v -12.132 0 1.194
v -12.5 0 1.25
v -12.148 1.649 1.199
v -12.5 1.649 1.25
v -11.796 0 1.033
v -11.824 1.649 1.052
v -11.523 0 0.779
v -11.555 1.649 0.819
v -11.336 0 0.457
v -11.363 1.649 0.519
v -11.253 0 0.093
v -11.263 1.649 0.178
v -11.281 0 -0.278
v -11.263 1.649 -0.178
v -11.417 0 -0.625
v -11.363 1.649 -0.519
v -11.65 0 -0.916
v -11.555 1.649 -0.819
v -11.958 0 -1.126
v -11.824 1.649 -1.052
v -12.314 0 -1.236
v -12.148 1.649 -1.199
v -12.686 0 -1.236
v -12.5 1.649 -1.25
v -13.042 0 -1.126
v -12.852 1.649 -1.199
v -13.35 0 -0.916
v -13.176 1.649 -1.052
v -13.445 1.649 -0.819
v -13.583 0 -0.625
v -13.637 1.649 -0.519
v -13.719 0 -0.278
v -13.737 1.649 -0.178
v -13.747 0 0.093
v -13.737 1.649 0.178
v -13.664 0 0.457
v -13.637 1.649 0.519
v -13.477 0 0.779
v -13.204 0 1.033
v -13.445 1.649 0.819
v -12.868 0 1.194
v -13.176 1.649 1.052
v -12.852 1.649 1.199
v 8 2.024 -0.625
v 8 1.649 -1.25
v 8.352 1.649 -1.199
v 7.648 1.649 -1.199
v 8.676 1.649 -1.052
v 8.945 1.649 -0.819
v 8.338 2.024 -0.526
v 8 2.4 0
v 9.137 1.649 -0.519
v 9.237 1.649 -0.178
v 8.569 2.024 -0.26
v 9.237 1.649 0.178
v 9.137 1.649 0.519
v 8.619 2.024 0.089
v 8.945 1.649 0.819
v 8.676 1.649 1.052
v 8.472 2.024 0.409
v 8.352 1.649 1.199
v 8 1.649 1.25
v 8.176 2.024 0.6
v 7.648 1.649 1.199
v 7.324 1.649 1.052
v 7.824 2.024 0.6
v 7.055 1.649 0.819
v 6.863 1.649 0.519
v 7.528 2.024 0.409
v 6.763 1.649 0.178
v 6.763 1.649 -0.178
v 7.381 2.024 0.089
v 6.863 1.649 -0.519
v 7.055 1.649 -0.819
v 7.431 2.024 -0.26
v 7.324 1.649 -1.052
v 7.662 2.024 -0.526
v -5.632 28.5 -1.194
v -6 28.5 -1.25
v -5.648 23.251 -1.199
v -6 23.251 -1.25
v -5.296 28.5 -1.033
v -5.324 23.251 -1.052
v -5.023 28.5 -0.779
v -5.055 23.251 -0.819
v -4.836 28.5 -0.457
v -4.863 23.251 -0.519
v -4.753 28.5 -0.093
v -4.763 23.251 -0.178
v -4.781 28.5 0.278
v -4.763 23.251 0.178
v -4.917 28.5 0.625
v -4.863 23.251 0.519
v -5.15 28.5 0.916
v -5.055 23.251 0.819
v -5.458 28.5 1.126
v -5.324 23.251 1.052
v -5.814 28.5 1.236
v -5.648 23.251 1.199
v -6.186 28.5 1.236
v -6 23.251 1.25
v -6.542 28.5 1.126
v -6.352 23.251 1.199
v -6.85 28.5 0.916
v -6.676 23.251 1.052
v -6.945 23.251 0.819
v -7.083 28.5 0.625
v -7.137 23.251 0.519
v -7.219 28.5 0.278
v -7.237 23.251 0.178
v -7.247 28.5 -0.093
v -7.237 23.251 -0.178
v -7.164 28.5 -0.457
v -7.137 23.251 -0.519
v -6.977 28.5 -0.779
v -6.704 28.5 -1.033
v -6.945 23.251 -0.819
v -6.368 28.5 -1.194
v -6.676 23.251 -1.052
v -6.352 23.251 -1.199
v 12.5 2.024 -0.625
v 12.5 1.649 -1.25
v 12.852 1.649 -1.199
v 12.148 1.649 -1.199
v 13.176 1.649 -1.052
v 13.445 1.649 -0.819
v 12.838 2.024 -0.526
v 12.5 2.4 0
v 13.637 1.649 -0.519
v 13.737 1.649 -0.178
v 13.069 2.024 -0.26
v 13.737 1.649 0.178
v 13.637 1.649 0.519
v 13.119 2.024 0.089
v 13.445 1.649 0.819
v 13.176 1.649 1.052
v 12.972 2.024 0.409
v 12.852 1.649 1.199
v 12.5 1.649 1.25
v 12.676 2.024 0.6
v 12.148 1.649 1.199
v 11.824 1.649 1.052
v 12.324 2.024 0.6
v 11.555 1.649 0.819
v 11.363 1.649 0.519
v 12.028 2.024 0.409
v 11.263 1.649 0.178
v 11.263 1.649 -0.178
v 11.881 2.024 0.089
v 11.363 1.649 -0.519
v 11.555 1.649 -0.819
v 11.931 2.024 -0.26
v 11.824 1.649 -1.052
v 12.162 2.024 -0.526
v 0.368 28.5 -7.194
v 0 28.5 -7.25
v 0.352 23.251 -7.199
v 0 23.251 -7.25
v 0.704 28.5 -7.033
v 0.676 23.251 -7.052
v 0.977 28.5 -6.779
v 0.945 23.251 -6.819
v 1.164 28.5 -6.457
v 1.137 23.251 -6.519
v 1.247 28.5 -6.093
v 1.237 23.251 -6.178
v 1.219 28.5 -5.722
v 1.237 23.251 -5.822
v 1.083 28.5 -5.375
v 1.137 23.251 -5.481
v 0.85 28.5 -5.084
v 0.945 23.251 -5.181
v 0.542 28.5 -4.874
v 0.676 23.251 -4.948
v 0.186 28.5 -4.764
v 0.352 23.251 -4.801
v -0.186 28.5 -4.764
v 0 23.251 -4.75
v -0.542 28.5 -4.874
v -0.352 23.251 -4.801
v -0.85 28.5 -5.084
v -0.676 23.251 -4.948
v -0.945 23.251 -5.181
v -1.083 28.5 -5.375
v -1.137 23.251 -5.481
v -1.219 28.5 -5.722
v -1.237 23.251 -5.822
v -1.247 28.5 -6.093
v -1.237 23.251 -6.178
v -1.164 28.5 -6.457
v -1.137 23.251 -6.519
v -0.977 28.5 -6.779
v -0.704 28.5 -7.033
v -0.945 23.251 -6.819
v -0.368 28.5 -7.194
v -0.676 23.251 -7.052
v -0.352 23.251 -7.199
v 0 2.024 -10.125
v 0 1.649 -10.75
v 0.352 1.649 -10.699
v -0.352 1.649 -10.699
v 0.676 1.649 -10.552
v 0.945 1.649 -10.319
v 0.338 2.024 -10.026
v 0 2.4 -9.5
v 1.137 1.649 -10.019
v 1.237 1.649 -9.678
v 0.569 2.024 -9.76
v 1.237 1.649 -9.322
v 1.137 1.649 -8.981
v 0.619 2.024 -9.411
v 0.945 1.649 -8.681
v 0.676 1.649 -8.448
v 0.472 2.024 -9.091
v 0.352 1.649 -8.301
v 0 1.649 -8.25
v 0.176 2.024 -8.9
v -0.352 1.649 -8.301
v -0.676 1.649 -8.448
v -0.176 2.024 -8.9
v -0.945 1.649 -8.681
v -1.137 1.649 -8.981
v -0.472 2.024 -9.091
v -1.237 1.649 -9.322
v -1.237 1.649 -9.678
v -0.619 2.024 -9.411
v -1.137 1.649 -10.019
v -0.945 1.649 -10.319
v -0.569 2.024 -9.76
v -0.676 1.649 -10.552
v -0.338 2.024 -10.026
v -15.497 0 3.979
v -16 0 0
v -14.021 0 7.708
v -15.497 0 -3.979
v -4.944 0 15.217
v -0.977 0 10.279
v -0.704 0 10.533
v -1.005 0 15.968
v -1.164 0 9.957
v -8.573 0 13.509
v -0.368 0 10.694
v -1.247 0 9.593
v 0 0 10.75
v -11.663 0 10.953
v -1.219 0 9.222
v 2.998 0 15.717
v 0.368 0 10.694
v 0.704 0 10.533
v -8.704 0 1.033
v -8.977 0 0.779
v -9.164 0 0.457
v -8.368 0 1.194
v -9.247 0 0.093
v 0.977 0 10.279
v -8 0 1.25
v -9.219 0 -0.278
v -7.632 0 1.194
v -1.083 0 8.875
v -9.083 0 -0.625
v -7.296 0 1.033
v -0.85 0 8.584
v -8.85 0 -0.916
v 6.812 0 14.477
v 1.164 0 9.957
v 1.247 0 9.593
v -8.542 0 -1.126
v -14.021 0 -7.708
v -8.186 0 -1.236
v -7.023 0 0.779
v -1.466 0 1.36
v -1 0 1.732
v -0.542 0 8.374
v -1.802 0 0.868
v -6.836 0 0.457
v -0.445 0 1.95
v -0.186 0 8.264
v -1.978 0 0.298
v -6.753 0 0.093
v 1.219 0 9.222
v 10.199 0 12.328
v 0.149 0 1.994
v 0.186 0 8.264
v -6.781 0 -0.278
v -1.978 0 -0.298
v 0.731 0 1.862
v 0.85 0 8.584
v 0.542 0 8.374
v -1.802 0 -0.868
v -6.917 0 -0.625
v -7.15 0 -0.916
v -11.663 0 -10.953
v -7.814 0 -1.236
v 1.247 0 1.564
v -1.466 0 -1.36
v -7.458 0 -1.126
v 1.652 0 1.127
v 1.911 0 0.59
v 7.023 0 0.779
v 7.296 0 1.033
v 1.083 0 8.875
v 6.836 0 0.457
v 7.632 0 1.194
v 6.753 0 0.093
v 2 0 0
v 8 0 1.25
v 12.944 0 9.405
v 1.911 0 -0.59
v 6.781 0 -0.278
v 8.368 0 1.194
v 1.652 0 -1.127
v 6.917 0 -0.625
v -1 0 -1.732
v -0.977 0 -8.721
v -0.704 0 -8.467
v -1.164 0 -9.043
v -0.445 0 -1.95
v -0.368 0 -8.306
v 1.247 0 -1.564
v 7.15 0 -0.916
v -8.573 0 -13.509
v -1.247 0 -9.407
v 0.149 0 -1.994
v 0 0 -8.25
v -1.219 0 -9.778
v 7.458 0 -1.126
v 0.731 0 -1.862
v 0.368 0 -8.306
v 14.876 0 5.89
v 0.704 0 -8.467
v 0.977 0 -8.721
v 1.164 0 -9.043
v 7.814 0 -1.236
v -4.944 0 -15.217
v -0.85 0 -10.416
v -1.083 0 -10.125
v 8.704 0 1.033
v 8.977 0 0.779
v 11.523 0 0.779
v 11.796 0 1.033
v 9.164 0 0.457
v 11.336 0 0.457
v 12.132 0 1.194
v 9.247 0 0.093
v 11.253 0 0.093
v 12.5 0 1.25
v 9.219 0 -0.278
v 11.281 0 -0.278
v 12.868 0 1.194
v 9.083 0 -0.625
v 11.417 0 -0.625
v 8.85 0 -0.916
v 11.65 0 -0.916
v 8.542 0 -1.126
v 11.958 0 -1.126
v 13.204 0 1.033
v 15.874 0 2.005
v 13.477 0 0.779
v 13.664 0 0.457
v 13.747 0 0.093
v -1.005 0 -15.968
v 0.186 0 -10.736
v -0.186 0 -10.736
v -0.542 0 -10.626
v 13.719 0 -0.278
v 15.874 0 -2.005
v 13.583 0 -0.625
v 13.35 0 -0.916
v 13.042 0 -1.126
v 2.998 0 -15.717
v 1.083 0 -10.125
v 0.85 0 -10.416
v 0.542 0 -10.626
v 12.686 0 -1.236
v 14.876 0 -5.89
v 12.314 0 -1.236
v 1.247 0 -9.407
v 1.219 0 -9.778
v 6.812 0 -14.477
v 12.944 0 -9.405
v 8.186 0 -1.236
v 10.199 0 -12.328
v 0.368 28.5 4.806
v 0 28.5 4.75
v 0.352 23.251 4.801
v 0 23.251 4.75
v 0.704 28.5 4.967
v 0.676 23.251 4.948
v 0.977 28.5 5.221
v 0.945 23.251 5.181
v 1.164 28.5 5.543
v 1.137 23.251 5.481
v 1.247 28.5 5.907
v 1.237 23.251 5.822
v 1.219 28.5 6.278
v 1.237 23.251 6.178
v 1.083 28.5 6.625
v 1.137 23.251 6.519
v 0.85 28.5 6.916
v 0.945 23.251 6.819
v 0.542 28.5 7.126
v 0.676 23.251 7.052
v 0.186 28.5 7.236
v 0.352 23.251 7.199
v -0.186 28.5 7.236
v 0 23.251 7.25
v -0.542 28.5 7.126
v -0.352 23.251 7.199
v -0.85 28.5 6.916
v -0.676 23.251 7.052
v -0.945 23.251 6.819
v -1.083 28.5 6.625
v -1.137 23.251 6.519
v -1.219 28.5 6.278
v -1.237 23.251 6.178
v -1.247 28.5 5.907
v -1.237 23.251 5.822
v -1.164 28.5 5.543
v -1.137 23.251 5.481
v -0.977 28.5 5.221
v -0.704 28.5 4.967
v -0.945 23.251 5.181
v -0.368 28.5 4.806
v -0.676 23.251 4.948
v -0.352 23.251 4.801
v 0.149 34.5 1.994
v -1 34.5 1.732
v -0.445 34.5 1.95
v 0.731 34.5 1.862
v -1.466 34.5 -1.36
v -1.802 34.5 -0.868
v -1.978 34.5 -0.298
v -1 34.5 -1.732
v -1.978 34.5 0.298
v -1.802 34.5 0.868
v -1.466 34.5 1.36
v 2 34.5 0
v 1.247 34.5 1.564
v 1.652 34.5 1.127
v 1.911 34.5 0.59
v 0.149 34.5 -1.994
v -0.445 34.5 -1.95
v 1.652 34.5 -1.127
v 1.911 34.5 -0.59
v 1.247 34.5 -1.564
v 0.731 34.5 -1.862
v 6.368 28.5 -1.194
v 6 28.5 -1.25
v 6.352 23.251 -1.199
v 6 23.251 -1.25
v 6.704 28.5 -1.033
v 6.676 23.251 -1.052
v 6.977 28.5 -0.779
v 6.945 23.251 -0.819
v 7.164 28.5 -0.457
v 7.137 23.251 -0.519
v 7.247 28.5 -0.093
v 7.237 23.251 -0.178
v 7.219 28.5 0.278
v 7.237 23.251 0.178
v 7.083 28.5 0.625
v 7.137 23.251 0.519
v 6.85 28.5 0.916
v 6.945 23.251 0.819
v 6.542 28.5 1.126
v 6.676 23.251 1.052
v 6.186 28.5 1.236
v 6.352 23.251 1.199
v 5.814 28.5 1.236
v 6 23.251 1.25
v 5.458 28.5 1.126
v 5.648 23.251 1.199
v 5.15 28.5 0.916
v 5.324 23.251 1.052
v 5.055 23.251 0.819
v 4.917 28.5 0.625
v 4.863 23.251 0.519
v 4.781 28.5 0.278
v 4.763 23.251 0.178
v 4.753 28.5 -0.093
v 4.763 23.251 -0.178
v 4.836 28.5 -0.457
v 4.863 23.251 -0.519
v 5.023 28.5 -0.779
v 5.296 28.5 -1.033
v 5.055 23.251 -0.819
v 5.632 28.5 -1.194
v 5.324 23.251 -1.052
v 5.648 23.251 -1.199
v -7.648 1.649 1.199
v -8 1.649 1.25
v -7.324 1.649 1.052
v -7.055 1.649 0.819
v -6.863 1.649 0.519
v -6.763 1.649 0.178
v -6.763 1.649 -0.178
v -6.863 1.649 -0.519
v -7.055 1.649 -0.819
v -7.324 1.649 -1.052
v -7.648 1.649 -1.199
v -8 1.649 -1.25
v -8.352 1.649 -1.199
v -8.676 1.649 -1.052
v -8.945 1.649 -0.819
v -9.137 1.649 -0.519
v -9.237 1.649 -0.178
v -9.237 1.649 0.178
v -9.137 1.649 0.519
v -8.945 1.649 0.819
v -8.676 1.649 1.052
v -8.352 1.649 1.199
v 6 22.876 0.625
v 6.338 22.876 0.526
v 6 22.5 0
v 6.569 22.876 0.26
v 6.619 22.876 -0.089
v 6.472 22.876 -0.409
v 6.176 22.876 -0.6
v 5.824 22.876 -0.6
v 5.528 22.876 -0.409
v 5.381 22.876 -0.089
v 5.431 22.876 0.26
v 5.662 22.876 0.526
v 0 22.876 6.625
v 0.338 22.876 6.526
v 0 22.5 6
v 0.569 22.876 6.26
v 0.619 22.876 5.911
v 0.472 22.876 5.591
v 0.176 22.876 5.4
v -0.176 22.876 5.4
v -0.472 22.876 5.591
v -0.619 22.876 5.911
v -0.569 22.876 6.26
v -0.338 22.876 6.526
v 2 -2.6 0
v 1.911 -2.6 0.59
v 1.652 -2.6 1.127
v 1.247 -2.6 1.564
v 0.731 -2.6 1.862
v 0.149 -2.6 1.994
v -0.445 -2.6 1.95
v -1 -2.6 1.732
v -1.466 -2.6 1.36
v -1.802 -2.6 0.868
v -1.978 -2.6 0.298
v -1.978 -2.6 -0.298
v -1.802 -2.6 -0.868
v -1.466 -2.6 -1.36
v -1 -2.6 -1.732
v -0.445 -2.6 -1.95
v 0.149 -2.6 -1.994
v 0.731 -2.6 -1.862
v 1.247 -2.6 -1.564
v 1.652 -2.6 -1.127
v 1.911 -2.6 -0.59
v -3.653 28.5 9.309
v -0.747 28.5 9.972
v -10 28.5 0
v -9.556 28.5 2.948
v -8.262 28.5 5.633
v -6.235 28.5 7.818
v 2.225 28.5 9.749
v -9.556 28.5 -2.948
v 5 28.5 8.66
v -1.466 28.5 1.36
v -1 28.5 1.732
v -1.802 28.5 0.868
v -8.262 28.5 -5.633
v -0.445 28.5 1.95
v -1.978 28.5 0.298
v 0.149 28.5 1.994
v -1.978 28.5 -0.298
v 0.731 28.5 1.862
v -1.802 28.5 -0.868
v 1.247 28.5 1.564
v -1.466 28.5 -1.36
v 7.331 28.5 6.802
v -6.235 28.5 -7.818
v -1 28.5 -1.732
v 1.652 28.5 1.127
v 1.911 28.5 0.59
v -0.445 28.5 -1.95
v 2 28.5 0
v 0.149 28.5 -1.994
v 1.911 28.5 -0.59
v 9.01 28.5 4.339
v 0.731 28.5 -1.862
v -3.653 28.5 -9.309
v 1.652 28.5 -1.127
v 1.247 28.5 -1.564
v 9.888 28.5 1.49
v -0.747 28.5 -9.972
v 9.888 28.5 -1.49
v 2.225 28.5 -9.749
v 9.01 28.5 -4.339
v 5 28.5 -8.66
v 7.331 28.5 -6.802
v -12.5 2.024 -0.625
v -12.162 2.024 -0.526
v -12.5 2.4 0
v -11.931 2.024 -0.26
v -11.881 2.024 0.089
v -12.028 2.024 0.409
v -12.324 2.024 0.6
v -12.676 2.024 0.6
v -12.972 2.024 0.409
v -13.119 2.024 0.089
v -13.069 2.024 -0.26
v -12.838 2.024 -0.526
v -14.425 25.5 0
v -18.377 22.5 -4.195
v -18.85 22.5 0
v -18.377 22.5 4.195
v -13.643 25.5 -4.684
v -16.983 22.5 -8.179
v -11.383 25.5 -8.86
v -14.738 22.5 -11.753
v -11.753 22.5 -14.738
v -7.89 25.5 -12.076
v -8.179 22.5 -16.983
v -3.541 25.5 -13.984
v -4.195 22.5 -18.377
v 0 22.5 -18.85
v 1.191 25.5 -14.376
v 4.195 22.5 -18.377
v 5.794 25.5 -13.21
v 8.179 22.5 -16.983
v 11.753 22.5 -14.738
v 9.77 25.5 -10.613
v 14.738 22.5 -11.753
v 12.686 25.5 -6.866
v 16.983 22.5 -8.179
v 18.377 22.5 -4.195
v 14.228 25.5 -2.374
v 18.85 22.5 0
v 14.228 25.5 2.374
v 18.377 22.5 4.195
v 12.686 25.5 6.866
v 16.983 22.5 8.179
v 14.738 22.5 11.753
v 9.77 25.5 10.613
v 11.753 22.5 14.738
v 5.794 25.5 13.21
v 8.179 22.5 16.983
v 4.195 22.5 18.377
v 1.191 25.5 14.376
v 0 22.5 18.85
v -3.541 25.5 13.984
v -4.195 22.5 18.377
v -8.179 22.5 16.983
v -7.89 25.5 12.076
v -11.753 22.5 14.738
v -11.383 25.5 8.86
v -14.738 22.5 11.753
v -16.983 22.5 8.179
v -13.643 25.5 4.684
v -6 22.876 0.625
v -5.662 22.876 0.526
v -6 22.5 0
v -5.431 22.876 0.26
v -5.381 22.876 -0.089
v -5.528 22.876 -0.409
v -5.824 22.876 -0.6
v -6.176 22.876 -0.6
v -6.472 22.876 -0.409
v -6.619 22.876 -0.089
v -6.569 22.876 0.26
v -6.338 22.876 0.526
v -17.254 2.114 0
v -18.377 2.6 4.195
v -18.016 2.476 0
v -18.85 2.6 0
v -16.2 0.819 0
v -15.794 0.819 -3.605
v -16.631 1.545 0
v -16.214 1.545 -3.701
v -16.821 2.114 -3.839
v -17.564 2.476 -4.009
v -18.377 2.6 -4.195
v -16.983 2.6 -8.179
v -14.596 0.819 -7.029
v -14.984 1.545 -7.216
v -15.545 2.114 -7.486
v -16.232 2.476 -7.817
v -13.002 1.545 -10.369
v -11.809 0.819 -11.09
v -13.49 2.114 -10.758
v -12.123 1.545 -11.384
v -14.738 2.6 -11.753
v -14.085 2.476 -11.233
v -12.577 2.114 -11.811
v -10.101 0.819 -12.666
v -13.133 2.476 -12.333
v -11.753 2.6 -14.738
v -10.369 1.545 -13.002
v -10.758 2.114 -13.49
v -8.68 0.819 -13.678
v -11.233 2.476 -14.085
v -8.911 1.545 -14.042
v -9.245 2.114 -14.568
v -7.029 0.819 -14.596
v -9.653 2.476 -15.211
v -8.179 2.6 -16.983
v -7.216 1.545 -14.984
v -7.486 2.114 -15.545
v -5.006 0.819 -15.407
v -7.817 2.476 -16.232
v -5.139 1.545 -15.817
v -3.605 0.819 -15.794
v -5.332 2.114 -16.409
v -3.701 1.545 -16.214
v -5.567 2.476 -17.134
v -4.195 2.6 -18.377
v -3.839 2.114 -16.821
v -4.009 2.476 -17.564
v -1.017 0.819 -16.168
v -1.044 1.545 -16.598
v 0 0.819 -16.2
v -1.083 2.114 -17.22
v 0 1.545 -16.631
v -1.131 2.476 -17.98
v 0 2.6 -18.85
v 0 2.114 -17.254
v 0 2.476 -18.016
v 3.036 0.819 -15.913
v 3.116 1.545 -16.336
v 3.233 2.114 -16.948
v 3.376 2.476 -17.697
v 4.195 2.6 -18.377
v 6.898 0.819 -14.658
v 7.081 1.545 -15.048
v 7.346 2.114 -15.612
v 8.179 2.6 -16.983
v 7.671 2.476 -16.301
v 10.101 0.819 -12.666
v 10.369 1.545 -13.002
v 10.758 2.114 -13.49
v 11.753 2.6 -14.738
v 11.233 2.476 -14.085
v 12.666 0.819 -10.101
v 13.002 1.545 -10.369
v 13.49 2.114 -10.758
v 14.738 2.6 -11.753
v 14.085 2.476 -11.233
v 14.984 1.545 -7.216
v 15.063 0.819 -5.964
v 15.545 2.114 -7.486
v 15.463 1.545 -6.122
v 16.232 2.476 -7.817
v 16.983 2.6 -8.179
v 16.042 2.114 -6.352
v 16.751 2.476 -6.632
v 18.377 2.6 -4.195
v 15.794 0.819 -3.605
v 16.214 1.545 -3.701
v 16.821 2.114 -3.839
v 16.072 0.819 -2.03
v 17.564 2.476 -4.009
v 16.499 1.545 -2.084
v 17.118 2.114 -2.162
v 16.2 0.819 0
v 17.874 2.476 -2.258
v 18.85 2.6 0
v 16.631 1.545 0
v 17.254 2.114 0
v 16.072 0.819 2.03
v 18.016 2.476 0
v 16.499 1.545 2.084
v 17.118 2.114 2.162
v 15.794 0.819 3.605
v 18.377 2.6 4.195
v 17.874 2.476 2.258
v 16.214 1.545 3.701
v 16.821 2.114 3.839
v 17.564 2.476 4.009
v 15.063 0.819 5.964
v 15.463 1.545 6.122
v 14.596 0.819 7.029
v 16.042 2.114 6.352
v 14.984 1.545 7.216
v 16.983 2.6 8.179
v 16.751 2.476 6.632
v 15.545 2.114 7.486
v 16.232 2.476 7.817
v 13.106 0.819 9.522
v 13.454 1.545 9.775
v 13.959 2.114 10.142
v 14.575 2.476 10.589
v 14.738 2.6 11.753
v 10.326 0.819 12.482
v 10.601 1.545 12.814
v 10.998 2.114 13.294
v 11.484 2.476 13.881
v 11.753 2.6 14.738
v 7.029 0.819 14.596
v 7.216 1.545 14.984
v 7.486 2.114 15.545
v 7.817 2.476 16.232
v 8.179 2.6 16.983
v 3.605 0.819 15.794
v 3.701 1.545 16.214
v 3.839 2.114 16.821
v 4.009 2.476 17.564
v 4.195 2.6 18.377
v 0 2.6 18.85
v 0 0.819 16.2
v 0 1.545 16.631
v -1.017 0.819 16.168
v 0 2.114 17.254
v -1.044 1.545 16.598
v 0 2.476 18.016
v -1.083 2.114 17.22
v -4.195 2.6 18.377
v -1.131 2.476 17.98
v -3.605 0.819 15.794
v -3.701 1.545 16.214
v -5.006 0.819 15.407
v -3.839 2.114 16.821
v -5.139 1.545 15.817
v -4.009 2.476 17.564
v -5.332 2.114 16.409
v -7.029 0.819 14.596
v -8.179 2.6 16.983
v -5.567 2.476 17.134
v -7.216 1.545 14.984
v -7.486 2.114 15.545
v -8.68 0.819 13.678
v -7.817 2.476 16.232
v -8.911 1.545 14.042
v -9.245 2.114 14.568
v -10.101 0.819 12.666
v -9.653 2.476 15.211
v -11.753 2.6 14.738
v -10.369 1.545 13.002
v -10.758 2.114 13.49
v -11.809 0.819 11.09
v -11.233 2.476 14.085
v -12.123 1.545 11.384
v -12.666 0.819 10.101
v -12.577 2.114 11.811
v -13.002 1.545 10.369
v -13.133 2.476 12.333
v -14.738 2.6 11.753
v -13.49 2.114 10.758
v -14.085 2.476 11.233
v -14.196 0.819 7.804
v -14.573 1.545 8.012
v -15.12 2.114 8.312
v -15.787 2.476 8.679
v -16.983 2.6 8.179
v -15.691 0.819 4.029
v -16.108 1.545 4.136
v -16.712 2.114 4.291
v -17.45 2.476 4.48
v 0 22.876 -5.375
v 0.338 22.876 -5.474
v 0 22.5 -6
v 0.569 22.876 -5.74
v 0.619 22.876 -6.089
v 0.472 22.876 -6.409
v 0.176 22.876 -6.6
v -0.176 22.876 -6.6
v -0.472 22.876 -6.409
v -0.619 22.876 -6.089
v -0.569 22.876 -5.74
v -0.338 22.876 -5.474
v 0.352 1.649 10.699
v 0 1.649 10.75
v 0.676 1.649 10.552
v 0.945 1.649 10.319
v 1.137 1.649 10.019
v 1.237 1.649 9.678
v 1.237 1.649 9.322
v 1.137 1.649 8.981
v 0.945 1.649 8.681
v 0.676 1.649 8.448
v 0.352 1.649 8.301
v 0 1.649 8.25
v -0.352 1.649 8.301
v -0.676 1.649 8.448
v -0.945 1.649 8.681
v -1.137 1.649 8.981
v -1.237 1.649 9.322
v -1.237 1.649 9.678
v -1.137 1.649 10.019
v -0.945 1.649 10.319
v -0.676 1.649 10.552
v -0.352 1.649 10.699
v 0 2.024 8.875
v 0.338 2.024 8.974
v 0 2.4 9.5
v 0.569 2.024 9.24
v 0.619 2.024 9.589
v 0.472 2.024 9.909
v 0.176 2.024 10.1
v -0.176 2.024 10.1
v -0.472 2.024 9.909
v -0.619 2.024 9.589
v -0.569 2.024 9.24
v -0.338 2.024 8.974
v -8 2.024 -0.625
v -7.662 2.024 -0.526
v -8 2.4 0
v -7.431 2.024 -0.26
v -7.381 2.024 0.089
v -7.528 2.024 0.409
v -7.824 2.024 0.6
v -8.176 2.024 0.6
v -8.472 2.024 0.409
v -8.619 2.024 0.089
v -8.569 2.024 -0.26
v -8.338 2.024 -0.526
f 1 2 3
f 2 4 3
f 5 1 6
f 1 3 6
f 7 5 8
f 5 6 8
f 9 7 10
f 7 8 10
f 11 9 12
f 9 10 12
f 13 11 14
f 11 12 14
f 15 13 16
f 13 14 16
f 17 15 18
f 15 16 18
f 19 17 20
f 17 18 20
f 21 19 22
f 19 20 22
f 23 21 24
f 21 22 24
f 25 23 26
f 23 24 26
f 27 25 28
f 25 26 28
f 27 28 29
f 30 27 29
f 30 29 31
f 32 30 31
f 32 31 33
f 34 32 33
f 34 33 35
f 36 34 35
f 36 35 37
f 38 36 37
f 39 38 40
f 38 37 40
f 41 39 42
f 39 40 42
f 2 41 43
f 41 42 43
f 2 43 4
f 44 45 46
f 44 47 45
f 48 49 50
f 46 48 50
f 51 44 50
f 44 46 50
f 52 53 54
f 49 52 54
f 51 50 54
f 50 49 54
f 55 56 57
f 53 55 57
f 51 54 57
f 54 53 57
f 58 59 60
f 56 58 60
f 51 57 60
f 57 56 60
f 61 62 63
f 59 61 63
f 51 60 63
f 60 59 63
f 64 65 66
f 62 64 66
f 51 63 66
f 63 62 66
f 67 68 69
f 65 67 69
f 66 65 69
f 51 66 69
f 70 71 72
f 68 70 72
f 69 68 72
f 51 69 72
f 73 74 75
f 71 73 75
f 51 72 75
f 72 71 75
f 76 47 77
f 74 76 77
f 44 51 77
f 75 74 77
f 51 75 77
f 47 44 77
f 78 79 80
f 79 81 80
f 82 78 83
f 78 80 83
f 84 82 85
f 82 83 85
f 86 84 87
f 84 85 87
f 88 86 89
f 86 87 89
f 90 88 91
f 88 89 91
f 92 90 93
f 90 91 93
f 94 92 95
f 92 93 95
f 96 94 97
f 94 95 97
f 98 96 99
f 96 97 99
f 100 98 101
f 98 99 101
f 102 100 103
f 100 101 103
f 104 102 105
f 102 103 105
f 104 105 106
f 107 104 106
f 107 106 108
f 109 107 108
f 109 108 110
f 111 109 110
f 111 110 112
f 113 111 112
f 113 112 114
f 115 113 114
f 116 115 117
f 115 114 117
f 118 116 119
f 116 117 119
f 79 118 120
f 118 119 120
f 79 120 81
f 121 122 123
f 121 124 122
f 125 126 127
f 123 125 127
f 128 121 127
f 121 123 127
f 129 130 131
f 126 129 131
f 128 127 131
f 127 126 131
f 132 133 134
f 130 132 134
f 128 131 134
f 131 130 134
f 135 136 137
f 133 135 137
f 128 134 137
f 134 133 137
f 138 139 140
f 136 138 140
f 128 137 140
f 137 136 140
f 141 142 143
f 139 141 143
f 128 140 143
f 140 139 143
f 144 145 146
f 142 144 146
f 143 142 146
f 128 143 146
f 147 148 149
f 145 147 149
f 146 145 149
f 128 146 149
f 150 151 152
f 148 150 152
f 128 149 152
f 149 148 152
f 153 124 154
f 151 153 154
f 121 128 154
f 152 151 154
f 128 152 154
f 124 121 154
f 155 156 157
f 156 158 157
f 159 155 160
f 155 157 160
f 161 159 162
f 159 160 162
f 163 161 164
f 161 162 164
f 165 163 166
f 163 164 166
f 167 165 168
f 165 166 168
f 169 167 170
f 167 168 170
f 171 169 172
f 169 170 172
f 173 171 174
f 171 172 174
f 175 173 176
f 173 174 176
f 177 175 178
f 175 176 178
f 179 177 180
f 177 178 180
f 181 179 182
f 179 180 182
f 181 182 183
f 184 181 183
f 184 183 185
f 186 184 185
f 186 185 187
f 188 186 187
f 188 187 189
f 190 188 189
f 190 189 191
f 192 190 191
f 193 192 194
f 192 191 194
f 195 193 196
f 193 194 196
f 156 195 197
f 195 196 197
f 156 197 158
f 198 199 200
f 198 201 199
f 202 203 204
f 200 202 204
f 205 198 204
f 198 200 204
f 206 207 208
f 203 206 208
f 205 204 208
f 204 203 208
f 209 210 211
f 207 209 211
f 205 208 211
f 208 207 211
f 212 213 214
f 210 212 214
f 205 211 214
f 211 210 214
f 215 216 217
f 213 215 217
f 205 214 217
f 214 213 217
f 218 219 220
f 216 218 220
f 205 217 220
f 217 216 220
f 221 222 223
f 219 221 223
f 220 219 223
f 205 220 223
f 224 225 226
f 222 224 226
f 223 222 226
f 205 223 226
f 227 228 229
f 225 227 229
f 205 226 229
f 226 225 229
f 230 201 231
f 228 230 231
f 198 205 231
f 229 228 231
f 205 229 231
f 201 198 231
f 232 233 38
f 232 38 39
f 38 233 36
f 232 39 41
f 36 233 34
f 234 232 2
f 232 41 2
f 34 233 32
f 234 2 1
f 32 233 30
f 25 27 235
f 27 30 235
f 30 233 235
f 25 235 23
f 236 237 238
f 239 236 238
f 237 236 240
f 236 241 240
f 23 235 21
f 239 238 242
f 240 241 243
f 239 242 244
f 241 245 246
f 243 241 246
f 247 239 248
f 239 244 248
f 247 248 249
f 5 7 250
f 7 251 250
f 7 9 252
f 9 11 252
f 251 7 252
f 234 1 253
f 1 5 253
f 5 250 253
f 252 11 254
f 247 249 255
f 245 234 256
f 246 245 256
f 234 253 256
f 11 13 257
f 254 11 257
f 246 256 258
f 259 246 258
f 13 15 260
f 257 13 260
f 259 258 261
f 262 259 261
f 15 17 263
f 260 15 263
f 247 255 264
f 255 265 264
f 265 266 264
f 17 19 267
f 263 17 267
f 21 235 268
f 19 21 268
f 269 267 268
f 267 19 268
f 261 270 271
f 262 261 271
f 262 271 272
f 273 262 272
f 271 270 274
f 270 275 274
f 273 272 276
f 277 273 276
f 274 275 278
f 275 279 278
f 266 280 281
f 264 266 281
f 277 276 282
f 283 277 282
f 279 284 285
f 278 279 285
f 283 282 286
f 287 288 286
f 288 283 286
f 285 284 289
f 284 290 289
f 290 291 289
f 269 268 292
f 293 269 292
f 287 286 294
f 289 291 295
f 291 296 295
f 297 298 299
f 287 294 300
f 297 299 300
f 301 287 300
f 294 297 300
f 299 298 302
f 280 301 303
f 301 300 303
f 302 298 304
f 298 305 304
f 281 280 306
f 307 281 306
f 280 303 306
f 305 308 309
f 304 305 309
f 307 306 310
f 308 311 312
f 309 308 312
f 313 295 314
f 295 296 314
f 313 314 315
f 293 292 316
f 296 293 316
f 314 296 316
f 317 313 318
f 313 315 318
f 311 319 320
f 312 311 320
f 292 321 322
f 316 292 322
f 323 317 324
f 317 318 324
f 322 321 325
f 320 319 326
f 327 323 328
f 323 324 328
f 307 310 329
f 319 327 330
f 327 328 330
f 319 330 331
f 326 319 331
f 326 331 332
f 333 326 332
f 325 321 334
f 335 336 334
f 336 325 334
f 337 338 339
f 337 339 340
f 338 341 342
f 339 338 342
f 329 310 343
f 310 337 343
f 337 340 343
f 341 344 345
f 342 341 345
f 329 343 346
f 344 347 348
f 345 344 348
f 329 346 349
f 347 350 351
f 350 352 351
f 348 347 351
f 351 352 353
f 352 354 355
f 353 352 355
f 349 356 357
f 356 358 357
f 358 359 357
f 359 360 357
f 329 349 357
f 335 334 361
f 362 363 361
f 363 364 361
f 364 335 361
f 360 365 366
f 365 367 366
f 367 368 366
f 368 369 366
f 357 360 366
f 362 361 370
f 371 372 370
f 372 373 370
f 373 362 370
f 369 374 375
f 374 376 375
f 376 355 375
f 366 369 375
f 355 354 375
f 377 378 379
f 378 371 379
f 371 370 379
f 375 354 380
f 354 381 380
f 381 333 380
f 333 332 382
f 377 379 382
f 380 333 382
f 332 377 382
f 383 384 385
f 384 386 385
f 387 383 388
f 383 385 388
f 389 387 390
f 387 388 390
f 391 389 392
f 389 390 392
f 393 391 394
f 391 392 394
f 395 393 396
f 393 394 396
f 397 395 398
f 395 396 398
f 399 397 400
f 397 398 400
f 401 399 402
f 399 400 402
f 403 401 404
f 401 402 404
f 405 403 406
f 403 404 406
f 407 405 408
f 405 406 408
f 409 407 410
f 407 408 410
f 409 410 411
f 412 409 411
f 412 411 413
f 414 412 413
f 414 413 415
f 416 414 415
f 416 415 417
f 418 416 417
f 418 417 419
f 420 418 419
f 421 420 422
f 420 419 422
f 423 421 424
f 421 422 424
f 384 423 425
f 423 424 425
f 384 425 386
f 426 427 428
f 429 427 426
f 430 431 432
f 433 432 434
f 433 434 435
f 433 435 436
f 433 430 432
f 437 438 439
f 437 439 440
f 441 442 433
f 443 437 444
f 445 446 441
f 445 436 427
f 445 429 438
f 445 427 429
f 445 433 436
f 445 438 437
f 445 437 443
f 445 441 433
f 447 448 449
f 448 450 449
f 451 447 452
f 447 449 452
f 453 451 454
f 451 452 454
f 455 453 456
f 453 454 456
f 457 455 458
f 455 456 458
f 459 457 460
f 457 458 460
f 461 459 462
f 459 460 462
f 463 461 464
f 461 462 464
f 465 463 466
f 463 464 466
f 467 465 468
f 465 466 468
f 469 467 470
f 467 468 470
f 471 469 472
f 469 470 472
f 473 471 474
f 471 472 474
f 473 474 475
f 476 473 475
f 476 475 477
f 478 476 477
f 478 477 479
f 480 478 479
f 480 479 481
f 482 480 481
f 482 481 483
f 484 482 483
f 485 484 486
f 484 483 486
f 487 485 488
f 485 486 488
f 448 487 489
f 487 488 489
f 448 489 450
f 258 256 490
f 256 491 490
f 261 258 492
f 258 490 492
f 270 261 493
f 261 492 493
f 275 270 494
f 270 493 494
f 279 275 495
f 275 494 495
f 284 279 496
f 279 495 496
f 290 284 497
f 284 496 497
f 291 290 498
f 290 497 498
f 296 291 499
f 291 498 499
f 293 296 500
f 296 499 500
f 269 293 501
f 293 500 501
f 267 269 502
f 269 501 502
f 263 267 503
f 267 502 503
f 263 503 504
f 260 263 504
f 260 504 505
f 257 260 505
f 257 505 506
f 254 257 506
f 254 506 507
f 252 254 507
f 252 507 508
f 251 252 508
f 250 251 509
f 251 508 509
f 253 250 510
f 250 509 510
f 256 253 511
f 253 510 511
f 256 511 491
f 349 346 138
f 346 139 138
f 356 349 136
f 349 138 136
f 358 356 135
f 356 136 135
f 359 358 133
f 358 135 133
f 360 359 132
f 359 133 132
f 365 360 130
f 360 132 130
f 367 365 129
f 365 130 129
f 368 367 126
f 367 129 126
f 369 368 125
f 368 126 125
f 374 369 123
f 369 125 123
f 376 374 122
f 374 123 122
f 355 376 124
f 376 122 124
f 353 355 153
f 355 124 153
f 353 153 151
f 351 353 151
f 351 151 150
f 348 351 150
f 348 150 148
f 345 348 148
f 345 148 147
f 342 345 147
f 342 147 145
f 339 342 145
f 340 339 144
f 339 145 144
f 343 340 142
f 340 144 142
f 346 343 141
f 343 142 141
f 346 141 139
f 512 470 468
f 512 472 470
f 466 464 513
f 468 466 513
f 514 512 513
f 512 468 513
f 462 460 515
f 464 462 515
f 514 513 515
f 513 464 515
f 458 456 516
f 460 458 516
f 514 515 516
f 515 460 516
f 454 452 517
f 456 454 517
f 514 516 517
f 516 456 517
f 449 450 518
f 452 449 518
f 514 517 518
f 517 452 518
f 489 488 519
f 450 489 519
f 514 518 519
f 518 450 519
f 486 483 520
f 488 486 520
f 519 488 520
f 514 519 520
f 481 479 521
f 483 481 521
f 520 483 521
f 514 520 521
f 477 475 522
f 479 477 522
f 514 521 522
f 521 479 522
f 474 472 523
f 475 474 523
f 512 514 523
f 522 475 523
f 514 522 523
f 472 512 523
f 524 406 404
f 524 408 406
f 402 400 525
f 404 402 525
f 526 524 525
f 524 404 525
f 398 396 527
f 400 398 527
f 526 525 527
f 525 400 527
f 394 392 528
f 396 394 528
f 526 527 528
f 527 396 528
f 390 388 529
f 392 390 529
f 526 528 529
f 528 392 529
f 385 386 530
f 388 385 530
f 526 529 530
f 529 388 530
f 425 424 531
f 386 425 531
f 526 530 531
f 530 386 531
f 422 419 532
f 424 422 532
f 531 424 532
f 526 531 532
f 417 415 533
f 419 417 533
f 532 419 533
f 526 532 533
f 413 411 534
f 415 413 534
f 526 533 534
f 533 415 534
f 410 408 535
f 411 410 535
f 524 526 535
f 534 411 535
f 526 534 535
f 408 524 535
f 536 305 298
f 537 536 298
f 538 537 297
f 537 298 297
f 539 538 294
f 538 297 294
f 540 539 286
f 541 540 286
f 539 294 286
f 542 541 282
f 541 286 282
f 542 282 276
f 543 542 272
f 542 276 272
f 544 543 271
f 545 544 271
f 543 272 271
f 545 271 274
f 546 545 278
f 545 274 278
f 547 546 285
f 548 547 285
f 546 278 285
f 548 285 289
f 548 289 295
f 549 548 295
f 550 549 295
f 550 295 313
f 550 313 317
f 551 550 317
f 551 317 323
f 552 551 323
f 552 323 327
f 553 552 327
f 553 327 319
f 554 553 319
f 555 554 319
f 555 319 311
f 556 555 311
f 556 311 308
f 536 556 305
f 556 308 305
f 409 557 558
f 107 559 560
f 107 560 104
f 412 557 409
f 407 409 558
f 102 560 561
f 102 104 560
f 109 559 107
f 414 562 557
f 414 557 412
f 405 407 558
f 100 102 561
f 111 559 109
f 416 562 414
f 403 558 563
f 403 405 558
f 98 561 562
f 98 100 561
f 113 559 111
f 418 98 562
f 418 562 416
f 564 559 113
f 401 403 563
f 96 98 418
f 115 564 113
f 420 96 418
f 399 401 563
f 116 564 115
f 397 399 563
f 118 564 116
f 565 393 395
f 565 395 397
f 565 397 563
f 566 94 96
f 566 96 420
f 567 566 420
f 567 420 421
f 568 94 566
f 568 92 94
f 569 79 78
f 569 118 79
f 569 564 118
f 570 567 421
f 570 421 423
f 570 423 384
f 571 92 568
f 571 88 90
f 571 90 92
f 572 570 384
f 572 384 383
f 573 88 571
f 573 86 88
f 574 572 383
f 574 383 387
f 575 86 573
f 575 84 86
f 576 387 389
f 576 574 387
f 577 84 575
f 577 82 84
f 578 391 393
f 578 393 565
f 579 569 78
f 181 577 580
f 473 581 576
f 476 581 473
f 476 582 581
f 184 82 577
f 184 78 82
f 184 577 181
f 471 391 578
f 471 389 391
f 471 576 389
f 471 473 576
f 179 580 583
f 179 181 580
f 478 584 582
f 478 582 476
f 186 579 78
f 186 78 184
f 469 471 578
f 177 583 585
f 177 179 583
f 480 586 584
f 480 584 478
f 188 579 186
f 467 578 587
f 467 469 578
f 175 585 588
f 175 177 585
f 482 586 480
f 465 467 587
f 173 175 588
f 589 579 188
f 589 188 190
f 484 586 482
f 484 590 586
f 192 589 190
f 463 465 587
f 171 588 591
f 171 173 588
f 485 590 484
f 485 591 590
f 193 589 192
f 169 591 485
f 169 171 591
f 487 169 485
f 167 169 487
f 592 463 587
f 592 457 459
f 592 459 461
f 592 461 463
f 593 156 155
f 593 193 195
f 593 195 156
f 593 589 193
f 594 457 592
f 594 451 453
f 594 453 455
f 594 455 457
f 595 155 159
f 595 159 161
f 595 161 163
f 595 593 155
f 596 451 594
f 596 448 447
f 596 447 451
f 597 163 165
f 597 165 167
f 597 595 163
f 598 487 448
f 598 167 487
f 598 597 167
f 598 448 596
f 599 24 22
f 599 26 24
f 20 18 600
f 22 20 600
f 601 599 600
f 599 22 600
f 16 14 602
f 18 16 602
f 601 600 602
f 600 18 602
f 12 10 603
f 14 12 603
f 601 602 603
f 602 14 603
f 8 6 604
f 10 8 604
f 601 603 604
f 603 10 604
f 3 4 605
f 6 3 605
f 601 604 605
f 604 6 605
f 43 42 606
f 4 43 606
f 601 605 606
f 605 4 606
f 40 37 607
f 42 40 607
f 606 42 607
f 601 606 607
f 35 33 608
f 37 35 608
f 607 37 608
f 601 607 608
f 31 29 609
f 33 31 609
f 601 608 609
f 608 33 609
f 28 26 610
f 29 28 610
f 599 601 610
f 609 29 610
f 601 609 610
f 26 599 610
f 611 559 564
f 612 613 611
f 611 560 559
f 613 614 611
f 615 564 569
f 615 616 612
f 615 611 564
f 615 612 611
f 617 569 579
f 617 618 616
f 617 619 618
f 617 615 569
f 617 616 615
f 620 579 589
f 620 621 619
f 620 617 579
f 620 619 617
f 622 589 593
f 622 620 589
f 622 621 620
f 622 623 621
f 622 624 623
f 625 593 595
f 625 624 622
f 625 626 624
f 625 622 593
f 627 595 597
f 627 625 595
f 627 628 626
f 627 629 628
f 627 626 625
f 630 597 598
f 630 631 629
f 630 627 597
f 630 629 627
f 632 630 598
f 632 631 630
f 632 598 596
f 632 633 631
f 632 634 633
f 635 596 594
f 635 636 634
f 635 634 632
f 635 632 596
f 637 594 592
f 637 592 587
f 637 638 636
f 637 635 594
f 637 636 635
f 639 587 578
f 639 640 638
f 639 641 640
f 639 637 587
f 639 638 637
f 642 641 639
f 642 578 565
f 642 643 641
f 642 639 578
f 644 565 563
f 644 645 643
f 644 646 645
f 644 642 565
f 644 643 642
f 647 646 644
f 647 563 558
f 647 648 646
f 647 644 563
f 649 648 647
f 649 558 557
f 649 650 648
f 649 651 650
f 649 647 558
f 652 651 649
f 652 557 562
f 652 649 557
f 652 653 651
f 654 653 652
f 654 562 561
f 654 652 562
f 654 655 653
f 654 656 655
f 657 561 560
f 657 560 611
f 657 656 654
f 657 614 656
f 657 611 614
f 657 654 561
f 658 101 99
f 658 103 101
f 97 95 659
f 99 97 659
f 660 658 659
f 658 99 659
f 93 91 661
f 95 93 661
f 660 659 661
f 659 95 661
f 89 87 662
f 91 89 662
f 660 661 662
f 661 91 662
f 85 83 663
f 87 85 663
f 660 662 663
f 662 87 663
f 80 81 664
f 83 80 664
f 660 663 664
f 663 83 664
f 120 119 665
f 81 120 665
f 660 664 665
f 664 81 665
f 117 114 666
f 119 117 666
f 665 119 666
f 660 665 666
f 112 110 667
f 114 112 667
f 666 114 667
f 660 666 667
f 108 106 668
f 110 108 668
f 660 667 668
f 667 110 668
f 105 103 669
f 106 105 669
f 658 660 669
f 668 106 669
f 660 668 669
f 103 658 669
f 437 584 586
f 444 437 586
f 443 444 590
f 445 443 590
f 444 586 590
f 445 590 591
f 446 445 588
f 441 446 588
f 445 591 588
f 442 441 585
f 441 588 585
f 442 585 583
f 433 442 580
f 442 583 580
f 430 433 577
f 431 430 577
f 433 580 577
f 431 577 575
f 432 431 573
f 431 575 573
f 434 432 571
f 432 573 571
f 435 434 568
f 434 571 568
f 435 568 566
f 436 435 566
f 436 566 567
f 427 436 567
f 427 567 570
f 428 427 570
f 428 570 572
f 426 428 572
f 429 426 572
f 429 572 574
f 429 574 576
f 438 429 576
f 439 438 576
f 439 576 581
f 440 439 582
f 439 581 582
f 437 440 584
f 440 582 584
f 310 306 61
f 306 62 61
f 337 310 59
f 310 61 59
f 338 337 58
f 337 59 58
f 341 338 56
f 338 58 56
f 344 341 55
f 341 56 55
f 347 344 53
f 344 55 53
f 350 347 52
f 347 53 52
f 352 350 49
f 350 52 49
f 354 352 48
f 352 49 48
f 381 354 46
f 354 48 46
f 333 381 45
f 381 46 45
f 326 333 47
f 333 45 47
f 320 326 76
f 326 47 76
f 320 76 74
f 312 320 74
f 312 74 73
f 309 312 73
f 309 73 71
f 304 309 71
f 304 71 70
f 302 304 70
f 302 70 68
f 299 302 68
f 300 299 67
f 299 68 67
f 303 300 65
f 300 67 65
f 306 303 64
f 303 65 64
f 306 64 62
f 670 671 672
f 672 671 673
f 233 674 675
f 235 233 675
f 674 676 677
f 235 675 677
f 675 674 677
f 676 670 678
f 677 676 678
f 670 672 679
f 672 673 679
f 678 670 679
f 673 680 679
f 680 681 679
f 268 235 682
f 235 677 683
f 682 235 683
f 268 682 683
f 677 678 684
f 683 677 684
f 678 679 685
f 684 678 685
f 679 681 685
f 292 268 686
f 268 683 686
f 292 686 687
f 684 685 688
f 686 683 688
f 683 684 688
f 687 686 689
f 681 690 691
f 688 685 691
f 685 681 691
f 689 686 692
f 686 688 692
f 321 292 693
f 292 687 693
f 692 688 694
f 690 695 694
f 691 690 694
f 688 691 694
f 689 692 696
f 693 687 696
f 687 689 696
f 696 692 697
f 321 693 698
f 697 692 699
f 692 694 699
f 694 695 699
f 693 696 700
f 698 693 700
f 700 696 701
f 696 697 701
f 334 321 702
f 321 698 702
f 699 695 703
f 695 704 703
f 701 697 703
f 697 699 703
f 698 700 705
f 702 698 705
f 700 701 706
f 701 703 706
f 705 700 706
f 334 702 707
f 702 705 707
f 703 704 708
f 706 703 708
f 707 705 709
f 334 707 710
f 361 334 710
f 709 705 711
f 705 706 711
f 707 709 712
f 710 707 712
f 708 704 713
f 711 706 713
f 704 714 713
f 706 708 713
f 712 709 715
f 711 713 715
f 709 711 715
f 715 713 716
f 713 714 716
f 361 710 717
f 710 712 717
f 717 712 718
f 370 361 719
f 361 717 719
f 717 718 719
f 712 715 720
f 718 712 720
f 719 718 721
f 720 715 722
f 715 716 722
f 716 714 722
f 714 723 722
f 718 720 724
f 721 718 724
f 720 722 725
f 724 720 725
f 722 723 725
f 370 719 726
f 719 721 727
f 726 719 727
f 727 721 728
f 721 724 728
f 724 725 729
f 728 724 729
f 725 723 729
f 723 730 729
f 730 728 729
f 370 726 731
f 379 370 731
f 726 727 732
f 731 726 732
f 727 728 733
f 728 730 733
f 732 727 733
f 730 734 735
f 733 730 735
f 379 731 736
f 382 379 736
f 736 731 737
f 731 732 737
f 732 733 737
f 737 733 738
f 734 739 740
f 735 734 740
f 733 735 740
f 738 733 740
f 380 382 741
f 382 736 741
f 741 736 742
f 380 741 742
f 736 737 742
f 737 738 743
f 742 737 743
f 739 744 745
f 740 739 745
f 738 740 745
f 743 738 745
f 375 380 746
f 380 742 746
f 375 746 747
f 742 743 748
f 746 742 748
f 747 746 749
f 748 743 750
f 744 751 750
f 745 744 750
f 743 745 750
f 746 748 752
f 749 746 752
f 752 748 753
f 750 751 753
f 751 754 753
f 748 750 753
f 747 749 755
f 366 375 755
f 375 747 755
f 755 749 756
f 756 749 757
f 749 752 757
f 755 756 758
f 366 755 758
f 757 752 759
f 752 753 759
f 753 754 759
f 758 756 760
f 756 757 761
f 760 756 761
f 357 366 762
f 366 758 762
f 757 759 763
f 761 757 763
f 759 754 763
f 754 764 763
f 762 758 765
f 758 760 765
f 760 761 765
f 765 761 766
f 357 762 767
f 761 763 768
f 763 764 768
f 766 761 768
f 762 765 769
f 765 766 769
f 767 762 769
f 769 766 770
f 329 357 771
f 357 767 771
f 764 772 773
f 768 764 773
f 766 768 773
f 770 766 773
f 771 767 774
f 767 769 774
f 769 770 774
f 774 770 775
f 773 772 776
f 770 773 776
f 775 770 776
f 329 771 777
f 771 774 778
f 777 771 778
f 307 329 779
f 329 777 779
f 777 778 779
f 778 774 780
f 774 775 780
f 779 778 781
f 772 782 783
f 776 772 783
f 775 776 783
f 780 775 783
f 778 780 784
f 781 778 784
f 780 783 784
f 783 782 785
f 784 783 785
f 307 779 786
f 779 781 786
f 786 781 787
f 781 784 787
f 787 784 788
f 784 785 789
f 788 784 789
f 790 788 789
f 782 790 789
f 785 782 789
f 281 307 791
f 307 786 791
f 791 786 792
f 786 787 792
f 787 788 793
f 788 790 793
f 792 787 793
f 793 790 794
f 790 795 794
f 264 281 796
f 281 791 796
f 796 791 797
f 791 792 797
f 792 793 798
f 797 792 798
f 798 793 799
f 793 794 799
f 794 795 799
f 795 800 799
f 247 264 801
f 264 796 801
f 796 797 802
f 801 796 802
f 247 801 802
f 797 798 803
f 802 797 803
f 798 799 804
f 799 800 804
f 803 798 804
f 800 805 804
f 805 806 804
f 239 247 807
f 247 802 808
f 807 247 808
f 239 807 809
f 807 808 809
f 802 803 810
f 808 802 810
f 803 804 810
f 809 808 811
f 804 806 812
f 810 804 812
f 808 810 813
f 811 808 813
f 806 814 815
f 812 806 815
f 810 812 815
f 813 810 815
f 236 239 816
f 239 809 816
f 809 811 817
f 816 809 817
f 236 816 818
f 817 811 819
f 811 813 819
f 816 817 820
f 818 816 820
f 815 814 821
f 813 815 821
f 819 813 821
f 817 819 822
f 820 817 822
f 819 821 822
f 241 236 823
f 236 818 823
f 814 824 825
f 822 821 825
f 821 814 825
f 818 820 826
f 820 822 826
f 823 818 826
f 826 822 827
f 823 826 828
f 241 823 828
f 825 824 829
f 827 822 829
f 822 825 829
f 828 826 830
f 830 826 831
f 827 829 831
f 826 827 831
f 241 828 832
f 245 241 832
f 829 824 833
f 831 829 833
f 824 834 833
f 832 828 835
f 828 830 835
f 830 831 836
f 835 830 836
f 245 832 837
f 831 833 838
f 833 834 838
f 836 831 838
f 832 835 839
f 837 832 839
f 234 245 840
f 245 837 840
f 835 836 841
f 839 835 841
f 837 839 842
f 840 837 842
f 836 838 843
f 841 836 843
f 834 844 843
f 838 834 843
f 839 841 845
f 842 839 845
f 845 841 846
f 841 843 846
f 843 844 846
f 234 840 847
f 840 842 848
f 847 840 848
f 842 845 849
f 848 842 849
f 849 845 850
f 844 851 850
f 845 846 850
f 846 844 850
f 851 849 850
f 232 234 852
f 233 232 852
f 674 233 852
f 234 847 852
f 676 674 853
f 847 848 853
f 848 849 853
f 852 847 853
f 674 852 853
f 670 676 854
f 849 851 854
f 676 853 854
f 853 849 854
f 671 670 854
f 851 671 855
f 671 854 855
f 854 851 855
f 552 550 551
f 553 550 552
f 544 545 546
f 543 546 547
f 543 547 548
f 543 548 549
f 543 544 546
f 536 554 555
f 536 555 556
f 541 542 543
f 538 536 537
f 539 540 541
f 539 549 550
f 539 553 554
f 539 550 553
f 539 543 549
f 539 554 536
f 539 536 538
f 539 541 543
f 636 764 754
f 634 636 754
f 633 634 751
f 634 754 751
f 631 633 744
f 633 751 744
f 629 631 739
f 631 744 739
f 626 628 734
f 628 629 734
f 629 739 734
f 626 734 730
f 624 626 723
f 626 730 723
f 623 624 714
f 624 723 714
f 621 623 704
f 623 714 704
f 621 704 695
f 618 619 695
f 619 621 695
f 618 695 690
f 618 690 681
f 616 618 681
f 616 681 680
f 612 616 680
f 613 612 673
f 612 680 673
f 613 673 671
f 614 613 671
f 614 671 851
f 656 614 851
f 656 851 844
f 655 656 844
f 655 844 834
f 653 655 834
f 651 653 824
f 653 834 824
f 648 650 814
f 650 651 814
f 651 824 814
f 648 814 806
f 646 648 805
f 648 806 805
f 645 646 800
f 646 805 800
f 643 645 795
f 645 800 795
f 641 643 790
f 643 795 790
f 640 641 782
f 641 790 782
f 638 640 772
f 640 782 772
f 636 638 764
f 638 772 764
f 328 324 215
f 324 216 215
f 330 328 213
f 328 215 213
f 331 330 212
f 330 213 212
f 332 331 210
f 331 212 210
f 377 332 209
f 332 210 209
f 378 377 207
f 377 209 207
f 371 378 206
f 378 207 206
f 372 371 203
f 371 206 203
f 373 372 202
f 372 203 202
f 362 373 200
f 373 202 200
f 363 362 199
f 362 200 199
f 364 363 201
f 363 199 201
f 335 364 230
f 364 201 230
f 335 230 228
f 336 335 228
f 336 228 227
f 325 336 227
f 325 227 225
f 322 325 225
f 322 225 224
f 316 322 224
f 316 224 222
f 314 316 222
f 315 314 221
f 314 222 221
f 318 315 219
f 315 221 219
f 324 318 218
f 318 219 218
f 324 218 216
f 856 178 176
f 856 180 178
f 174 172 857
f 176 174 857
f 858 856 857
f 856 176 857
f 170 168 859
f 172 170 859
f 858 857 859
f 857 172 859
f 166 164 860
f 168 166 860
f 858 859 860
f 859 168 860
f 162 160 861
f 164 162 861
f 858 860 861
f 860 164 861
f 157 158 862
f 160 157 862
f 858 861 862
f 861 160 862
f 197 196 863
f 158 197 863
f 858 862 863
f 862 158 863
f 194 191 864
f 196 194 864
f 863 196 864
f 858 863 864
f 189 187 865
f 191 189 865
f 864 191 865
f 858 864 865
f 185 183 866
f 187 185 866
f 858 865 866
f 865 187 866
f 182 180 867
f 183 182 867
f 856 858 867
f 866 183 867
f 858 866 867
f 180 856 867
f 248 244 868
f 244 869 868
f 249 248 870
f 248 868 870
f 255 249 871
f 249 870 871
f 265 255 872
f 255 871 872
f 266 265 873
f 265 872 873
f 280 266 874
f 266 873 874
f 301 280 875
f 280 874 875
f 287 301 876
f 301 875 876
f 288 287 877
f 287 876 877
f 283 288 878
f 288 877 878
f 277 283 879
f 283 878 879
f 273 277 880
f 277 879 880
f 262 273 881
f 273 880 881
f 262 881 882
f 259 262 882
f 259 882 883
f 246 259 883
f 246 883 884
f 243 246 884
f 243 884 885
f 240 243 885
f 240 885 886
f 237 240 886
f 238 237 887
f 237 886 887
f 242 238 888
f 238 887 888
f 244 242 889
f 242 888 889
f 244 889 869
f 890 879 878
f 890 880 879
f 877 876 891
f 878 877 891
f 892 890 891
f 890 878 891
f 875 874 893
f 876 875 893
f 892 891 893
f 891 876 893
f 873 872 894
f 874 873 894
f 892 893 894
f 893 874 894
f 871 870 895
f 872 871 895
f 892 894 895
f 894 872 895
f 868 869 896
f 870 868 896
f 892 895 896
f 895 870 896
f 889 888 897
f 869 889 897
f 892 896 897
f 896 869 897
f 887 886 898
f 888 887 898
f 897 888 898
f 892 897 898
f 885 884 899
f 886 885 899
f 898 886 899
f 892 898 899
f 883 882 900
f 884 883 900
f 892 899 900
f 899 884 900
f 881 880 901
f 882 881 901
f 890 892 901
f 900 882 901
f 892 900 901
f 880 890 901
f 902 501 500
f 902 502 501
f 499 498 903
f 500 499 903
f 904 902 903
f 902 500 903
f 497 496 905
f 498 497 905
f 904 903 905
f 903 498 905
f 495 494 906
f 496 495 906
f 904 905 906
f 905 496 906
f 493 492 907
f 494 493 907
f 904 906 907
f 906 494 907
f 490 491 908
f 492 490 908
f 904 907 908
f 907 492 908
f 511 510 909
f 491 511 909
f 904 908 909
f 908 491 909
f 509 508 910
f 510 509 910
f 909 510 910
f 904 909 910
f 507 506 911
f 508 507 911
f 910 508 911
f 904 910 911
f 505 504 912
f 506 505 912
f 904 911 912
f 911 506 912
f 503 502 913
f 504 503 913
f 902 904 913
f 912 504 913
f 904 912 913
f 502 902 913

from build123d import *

# Parameters (mm, degrees)
SKETCH1_R                 = 18.85
BOSS_EXTRUDE1_DEPTH       = 28.5
SKETCH2_R                 = 2
BOSS_EXTRUDE2_DEPTH       = 6
SKETCH3_R                 = 2
BOSS_EXTRUDE3_DEPTH       = 2.6
M3X0_5_TAPPED_HOLE1_D     = 2.5
M3X0_5_TAPPED_HOLE1_DEPTH = 1.648924226
M3X0_5_TAPPED_HOLE1_TIP   = 0.751075774
M3X0_5_TAPPED_HOLE2_D     = 2.5
M3X0_5_TAPPED_HOLE2_DEPTH = 5.248924226
M3X0_5_TAPPED_HOLE2_TIP   = 0.751075774


with BuildPart() as part:
    # Sketch1 → Boss-Extrude1 (new body)
    with BuildSketch(Plane(origin=(0, 0, 0), x_dir=(1, 0, 0), z_dir=(0, 1, 0))):
        Circle(SKETCH1_R)
    extrude(amount=BOSS_EXTRUDE1_DEPTH)

    # Sketch2 → Boss-Extrude2 (add)
    with BuildSketch(Plane(origin=(0, 28.5, 0), x_dir=(1, 0, 0), z_dir=(0, 1, 0))):
        Circle(SKETCH2_R)
    extrude(amount=BOSS_EXTRUDE2_DEPTH)

    # Sketch3 → Boss-Extrude3 (add)
    with BuildSketch(Plane.XZ):
        Circle(SKETCH3_R)
    extrude(amount=BOSS_EXTRUDE3_DEPTH)

    # M3x0.5 Tapped Hole1
    with Locations(Plane(origin=(0, 0, 9.5), x_dir=(0, 0, -1), z_dir=(0, -1, 0))):
        with Locations((0, 0), (9.5, 8), (9.5, 12.5), (19, 0), (9.5, -8), (9.5, -12.5)):
            Hole(M3X0_5_TAPPED_HOLE1_D / 2, depth=M3X0_5_TAPPED_HOLE1_DEPTH)
            with Locations((0, 0, -(M3X0_5_TAPPED_HOLE1_DEPTH + M3X0_5_TAPPED_HOLE1_TIP / 2))):  # 118° drill point
                Cone(0, M3X0_5_TAPPED_HOLE1_D / 2, M3X0_5_TAPPED_HOLE1_TIP, mode=Mode.SUBTRACT)

    # Sketch10 → Cut-Revolve1 (revolve, cut)
    with BuildSketch(Plane.XY):
        Polygon((-18.85, 28.5), (-10, 28.5), (-18.85, 22.5), align=None)
        with BuildLine():
            Line((-18.85, 2.6), (-18.85, 0))
            Line((-18.85, 0), (-16, 0))
            ThreePointArc((-16, 0), (-16.921107831, 1.852343339), (-18.85, 2.6))
        make_face()
    revolve(axis=Axis((0, 28.5, 0), (0, -1, 0)), mode=Mode.SUBTRACT)

    # M3x0.5 Tapped Hole2
    with Locations(Plane(origin=(0, 28.5, -6), x_dir=(0, 0, 1), z_dir=(0, 1, 0))):
        with Locations((0, 0), (6, 6), (12, 0), (6, -6)):
            Hole(M3X0_5_TAPPED_HOLE2_D / 2, depth=M3X0_5_TAPPED_HOLE2_DEPTH)
            with Locations((0, 0, -(M3X0_5_TAPPED_HOLE2_DEPTH + M3X0_5_TAPPED_HOLE2_TIP / 2))):  # 118° drill point
                Cone(0, M3X0_5_TAPPED_HOLE2_D / 2, M3X0_5_TAPPED_HOLE2_TIP, mode=Mode.SUBTRACT)


solid = part.part
